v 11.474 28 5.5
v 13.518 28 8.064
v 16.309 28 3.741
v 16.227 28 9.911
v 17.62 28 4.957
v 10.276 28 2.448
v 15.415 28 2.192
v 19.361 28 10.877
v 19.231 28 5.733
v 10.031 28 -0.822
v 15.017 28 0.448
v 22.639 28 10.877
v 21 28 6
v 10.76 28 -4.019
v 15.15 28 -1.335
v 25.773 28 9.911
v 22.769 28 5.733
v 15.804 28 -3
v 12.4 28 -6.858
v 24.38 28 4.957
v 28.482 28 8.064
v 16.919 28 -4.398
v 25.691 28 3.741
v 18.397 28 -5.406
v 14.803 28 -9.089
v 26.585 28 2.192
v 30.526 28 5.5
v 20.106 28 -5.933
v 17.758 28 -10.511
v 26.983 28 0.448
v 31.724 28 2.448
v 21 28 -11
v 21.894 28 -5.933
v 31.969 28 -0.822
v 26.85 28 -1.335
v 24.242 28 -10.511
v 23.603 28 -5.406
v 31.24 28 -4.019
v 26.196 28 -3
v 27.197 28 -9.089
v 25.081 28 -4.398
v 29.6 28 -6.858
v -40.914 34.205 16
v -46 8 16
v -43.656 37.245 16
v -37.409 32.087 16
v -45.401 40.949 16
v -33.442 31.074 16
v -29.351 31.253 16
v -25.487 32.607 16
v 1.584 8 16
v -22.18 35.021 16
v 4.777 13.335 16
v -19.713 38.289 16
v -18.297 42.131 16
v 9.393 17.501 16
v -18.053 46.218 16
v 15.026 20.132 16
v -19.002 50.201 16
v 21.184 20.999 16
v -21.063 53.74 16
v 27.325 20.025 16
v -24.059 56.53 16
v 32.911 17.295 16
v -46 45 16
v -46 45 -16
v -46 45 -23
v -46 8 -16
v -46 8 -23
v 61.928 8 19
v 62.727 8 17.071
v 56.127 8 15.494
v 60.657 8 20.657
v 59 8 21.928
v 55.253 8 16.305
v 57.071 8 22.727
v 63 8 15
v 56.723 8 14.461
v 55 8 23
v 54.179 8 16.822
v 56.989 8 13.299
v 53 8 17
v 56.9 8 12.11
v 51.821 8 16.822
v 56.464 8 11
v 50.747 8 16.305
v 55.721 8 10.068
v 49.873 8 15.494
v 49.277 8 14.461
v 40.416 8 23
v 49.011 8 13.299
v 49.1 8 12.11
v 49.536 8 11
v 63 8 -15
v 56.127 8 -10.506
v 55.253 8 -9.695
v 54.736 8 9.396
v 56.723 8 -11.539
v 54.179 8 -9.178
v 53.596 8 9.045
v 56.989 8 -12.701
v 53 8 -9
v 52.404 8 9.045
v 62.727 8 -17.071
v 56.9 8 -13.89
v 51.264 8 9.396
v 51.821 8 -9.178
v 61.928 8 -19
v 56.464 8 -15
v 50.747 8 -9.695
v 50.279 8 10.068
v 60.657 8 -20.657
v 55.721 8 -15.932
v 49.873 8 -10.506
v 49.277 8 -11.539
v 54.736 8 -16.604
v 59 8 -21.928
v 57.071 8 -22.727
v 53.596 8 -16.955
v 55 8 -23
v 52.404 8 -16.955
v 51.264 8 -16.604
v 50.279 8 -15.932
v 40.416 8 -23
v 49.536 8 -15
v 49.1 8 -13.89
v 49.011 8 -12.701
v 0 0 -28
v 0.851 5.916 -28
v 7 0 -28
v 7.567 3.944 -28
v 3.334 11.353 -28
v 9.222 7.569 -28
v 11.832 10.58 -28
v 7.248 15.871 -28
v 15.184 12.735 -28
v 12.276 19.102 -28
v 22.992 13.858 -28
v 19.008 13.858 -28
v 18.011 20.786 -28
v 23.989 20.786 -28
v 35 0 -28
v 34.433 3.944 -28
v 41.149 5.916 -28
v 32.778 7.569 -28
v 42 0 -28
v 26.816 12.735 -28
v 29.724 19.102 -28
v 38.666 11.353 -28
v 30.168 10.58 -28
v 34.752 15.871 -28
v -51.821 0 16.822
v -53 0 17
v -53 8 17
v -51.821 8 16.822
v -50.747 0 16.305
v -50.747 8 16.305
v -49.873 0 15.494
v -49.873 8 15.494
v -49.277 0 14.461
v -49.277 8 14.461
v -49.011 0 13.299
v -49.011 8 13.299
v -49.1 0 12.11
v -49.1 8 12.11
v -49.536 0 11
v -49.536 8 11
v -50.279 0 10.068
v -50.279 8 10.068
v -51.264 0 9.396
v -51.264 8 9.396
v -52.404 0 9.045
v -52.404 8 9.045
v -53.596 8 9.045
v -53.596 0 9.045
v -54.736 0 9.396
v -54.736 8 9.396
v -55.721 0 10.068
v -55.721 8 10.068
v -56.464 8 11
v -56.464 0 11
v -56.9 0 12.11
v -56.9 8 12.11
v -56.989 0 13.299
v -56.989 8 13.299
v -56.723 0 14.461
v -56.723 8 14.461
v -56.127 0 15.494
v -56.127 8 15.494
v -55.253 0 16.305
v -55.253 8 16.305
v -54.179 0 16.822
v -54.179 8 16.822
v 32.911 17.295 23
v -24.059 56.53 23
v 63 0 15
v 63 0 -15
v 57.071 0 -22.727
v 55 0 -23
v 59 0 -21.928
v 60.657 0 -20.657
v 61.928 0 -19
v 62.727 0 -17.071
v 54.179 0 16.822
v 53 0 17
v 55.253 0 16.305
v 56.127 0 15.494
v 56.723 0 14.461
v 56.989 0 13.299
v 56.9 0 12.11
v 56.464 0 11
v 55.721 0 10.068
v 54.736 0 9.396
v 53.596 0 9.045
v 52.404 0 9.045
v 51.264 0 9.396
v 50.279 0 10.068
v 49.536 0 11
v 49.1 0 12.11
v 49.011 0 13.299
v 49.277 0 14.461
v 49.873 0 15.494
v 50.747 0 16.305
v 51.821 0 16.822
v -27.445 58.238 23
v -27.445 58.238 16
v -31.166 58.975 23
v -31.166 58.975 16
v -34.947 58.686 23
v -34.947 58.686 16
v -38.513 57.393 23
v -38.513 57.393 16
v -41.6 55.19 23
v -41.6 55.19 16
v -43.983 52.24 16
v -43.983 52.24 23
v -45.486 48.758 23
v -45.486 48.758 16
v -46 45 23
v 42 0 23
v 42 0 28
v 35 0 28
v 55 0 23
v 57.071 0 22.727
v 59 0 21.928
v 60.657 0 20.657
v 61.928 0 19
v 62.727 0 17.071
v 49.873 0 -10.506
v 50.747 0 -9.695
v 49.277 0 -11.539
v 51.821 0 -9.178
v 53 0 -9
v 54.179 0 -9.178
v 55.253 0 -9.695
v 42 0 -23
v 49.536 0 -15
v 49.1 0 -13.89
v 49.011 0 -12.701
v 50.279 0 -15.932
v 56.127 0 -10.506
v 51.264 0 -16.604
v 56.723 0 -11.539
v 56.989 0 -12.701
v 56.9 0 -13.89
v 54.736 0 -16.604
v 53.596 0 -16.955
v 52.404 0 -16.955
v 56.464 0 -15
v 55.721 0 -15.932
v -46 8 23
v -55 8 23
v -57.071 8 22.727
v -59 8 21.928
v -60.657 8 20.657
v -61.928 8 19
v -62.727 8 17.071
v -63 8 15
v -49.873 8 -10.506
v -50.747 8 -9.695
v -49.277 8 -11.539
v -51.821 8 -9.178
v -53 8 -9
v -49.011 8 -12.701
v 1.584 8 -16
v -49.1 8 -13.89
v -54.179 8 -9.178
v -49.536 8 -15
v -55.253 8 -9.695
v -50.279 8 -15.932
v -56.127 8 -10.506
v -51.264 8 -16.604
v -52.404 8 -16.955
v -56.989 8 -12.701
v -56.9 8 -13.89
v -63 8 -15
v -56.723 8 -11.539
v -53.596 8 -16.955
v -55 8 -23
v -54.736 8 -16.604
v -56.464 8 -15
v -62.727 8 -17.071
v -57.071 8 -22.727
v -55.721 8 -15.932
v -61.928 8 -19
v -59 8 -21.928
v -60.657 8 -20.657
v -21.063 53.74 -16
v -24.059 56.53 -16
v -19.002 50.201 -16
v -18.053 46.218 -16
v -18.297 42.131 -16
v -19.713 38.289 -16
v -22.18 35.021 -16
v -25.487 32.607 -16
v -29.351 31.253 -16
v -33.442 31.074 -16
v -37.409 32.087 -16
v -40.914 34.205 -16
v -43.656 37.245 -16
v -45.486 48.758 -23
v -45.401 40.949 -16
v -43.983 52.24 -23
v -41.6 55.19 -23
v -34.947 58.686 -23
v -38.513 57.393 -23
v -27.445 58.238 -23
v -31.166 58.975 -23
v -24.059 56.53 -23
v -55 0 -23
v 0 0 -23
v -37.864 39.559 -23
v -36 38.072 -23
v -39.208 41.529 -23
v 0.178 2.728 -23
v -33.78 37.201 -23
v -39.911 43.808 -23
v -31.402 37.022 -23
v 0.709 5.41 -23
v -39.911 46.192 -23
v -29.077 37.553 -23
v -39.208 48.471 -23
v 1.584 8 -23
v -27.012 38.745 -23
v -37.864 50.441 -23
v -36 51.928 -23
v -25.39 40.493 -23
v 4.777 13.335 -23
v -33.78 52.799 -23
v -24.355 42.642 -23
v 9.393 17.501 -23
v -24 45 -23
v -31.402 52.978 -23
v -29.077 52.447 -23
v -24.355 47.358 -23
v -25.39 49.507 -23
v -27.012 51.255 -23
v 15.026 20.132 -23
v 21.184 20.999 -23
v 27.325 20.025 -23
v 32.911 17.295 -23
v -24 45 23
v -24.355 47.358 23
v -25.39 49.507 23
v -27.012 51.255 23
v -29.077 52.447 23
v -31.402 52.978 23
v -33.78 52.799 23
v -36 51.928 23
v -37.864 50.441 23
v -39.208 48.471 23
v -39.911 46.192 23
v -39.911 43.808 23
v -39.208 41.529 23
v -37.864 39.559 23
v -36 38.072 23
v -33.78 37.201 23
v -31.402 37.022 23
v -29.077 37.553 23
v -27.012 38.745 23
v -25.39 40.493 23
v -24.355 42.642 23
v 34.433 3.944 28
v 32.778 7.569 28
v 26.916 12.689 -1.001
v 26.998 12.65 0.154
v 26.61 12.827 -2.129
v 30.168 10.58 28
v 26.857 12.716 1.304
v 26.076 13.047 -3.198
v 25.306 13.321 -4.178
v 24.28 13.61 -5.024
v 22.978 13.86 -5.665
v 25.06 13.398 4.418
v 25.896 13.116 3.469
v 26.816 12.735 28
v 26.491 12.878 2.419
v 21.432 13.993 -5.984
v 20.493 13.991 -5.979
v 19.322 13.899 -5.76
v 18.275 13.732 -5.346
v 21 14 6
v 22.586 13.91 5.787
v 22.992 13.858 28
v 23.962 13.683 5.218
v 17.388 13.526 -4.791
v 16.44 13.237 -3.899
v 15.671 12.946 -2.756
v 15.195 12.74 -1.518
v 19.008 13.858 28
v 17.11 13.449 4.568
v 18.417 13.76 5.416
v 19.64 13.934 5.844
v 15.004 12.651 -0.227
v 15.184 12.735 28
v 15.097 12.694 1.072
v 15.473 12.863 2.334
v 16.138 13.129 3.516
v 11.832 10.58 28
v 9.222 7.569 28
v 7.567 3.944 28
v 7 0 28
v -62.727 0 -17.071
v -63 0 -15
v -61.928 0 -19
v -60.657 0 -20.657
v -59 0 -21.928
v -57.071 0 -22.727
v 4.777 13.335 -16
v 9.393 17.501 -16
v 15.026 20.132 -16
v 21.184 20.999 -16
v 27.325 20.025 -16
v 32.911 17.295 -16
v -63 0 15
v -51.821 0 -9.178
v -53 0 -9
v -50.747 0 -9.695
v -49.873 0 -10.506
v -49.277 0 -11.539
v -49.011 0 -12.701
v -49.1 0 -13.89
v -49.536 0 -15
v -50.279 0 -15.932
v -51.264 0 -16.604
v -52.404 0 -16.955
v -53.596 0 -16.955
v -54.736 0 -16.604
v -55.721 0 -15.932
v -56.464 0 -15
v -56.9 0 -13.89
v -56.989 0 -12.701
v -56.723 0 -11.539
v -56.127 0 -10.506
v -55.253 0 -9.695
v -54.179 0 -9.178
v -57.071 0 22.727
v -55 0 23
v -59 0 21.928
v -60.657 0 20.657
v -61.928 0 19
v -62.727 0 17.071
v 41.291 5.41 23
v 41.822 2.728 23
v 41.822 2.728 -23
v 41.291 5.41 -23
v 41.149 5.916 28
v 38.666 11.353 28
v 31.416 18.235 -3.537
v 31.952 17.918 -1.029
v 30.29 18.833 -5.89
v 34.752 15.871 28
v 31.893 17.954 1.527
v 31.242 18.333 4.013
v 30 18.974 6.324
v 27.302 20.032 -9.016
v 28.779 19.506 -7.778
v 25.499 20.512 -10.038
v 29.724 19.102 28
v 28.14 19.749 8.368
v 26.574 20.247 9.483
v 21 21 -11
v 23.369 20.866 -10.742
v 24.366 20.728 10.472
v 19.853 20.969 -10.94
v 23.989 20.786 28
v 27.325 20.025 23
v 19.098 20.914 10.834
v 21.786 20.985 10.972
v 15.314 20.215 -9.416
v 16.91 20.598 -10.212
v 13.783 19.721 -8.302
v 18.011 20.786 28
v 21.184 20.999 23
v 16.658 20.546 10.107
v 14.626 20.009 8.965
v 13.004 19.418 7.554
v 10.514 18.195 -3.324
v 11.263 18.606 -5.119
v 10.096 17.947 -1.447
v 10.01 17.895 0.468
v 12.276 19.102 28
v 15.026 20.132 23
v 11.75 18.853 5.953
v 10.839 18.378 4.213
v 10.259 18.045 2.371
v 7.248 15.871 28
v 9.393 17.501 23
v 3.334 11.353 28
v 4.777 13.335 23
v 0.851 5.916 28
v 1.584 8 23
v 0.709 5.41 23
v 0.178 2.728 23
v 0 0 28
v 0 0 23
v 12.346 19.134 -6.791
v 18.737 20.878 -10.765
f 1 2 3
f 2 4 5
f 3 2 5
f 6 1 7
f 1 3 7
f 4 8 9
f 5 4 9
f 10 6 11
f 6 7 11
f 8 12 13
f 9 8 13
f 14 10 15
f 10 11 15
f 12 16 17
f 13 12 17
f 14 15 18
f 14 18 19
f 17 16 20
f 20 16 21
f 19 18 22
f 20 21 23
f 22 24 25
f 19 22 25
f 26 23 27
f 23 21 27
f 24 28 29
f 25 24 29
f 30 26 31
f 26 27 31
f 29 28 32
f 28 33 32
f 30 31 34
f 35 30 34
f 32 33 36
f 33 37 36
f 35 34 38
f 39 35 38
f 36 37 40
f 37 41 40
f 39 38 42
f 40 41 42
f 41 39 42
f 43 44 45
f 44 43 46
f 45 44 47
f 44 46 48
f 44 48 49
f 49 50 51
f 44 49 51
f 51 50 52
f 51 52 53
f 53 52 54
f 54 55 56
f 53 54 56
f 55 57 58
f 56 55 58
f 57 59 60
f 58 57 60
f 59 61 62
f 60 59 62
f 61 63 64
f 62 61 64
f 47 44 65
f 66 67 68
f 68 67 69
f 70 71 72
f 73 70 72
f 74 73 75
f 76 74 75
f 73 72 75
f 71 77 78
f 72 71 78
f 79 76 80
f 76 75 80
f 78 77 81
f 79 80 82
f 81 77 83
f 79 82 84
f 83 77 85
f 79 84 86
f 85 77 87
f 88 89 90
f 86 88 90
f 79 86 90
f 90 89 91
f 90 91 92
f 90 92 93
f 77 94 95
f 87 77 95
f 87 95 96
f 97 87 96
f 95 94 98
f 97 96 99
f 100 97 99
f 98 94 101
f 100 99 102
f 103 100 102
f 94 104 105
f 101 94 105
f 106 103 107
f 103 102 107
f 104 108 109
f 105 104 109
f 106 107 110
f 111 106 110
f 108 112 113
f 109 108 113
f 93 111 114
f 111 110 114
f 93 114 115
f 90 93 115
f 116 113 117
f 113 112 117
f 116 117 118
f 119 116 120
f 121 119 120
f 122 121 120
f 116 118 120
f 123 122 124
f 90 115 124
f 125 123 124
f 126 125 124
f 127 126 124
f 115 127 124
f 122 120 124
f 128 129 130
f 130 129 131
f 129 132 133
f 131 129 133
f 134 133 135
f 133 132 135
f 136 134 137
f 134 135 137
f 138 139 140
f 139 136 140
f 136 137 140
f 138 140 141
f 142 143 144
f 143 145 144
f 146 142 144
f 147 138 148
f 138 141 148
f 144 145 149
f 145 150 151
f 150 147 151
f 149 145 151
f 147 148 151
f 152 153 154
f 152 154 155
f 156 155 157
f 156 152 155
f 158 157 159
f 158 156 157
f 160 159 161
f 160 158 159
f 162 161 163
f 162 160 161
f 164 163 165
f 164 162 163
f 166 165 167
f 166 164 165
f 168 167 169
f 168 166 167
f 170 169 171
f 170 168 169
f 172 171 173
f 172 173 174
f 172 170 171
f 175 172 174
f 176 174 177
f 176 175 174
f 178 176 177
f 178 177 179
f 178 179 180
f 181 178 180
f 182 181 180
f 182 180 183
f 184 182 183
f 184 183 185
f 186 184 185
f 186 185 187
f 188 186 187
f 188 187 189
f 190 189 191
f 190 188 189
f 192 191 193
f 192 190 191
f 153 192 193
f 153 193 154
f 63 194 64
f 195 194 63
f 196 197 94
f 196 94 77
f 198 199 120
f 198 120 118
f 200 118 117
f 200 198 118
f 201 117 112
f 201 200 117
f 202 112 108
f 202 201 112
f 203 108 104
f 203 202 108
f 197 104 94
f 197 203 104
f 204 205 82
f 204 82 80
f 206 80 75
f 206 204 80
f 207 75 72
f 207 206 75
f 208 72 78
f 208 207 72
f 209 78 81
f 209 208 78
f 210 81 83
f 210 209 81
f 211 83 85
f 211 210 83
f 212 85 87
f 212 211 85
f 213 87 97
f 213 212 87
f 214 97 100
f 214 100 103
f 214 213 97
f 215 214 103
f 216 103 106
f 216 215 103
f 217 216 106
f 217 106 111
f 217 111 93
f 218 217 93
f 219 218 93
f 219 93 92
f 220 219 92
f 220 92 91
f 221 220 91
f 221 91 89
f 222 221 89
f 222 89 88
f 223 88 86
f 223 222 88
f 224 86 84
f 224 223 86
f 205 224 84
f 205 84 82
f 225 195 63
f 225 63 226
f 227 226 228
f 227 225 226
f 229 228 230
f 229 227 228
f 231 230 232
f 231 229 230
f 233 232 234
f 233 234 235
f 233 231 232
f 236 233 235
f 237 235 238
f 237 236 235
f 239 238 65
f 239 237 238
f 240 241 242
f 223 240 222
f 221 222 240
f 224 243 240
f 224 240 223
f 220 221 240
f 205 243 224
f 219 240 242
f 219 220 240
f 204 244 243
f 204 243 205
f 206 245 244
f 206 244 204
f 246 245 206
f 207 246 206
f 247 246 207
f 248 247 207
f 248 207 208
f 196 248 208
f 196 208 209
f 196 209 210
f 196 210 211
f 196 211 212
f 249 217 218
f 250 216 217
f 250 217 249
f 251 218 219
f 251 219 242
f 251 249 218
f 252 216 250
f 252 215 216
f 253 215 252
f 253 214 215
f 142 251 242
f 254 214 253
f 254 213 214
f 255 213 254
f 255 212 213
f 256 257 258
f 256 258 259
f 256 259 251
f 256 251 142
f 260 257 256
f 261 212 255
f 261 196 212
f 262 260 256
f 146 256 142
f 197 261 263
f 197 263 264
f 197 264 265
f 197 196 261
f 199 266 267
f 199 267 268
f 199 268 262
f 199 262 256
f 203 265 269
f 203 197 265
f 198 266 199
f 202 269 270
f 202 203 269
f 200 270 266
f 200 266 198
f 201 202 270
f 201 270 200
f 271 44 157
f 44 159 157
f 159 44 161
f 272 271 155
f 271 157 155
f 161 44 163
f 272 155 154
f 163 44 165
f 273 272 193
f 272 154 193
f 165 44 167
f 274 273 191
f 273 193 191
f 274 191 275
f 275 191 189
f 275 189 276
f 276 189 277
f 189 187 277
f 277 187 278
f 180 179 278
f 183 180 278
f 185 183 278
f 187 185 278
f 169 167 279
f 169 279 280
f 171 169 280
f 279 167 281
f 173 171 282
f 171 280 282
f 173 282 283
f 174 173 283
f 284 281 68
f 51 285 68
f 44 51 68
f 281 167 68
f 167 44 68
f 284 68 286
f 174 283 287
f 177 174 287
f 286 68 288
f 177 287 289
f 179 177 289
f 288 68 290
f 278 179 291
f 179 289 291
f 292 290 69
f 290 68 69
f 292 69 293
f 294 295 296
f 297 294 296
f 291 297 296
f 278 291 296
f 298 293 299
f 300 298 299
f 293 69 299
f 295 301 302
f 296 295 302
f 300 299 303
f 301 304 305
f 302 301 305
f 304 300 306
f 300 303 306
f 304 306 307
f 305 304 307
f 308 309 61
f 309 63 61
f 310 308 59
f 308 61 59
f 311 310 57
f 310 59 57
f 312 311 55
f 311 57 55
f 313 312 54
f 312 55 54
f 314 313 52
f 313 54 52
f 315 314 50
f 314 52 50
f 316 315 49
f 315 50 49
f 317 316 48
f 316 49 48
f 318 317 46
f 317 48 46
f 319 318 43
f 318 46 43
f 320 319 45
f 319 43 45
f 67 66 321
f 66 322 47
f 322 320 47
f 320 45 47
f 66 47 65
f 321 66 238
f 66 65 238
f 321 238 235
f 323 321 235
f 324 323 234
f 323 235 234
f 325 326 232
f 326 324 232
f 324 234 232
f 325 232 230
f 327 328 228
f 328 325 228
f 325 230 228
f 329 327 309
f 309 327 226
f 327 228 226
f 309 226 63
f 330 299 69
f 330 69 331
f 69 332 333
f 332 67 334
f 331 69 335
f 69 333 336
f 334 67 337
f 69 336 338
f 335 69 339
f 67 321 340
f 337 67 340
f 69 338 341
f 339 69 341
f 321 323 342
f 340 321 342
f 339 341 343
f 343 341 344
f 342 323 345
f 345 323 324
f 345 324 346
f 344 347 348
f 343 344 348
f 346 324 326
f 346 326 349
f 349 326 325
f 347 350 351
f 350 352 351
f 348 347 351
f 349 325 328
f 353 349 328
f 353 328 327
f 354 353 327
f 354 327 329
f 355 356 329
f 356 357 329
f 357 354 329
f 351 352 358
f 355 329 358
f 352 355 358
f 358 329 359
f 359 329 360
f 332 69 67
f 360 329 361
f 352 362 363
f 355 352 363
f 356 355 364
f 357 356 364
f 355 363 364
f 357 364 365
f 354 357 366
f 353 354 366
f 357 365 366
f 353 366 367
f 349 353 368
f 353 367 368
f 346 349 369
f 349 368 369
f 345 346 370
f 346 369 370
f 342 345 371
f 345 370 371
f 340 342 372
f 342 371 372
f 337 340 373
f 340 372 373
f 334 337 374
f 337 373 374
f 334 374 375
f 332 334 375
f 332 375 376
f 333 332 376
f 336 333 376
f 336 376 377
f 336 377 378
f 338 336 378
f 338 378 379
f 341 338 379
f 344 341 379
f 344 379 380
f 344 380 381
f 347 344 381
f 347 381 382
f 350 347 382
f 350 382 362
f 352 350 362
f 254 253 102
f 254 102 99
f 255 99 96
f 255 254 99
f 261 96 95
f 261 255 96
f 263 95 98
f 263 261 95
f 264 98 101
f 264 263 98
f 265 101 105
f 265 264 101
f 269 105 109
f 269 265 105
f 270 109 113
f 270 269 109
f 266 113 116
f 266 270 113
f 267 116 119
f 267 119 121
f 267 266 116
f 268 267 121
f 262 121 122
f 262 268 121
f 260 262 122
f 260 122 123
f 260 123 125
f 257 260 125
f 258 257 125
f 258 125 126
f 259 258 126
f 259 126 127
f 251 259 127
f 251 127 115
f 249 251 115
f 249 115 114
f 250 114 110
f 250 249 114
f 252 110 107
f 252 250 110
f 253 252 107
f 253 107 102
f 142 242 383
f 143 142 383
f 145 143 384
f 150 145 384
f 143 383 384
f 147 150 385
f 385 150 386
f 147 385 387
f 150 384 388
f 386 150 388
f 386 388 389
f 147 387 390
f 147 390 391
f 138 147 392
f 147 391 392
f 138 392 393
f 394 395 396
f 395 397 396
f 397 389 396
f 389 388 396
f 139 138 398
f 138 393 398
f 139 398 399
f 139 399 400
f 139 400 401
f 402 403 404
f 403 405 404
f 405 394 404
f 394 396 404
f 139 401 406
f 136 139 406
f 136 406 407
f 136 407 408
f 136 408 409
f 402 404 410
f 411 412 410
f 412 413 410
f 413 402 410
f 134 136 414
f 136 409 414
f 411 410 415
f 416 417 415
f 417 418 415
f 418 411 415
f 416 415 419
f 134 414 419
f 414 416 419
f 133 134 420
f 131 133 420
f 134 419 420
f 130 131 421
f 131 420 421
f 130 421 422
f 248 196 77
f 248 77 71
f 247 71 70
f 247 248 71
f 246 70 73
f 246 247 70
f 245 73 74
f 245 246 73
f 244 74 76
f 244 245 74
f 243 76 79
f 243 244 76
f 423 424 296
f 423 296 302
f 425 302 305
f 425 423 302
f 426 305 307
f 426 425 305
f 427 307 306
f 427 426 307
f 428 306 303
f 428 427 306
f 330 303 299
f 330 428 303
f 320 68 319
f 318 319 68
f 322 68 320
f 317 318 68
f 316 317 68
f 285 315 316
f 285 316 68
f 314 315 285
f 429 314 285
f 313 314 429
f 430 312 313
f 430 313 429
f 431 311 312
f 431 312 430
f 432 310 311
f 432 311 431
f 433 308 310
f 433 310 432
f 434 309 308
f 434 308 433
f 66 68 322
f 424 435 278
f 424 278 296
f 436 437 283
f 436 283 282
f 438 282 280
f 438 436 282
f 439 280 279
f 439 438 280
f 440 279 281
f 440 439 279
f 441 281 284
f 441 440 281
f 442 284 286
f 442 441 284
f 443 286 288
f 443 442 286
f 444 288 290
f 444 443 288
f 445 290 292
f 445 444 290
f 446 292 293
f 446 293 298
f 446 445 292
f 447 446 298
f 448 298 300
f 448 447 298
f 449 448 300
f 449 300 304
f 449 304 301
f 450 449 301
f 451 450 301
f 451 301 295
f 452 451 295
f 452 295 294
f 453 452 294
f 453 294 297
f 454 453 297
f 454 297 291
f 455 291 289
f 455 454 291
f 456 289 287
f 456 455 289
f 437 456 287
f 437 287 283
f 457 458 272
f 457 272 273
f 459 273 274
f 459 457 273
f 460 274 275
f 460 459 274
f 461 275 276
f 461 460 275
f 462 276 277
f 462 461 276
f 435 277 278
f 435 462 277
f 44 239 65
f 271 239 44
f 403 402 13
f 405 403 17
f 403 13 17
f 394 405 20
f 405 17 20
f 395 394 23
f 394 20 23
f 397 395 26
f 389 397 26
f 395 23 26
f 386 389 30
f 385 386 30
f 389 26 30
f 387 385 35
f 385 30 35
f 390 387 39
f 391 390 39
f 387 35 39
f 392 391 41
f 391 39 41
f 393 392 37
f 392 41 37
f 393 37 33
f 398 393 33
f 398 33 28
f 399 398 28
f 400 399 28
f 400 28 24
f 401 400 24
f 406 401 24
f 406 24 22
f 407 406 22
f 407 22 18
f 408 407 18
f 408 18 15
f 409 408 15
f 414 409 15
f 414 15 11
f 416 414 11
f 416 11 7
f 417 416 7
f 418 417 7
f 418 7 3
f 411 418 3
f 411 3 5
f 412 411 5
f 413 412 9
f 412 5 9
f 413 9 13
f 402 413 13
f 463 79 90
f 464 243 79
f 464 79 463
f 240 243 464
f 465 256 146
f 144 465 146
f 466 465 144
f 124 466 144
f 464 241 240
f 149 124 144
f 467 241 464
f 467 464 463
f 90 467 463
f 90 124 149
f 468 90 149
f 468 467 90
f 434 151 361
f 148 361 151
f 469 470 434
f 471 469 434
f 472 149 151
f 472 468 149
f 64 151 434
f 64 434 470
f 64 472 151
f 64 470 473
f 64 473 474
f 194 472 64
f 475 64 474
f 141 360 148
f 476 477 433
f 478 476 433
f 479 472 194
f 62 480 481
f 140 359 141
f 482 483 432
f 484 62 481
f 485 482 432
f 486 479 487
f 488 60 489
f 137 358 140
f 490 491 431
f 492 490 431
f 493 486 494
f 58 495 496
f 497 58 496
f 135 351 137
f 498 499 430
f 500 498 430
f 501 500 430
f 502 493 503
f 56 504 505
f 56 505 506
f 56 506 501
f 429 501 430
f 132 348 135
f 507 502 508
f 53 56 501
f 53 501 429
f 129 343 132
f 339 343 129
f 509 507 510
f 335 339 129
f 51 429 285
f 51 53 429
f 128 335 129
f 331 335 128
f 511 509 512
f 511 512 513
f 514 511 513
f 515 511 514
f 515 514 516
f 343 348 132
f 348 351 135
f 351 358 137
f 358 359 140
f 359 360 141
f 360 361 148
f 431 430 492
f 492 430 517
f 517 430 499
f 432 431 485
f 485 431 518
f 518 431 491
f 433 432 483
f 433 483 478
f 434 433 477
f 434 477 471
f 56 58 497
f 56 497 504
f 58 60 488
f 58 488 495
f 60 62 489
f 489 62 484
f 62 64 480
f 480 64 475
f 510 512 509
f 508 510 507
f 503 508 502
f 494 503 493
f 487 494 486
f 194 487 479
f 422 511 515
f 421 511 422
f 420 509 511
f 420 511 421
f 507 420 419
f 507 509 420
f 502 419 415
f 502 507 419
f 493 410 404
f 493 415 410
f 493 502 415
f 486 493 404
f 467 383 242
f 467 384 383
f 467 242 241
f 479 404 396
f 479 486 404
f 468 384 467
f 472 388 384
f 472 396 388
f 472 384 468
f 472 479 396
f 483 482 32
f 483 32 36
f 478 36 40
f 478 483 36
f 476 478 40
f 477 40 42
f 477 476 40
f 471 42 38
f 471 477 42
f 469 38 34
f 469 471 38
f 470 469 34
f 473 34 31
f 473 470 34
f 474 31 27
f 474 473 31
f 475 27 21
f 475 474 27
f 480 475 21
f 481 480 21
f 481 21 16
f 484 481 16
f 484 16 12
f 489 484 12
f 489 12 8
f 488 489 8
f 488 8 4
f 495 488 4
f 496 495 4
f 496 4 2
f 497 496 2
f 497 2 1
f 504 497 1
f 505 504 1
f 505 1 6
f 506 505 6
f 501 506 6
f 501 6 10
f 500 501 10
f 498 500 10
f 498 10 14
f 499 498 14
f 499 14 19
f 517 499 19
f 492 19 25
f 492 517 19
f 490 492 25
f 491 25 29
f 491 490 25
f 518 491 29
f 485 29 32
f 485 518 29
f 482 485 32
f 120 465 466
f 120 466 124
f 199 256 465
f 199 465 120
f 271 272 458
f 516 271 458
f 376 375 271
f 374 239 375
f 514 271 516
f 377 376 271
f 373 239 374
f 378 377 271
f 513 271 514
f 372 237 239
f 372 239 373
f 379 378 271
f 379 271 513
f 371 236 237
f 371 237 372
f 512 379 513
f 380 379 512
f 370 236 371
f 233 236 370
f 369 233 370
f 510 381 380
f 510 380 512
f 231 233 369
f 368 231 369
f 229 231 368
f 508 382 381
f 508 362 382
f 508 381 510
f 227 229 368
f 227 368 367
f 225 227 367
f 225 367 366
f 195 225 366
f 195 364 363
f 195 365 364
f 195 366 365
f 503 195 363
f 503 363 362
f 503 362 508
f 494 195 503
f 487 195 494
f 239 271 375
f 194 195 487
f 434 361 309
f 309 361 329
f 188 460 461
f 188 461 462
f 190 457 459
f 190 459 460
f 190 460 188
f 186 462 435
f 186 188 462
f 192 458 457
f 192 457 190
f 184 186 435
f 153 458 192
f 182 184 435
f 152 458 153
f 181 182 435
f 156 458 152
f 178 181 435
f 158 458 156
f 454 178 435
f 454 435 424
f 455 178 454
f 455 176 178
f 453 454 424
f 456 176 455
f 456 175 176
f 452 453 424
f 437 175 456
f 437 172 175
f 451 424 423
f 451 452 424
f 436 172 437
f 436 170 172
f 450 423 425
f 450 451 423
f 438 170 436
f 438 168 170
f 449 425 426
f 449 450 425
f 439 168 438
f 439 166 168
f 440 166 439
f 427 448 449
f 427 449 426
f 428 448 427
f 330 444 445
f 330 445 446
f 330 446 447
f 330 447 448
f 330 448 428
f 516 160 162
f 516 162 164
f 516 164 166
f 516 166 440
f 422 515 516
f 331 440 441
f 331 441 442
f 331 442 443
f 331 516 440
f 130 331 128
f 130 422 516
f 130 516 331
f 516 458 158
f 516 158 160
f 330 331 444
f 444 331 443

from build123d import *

# Parameters (mm, degrees)
SKETCH1_R                = 4
BOSS_EXTRUDE1_DEPTH      = 8
BOSS_EXTRUDE2_DEPTH      = 5
BOSS_EXTRUDE2_DEPTH_BACK = 51
BOSS_EXTRUDE3_DEPTH      = 7
BOSS_EXTRUDE5_REACH      = 46
SKETCH7_R                = 14
SKETCH4_R                = 11
BOSS_EXTRUDE4_DEPTH      = 28
CUT_EXTRUDE1_REACH       = 58
SKETCH5_R                = 14
SKETCH5_R_2              = 8
SKETCH6_R                = 6
CUT_EXTRUDE2_DEPTH       = 28


with BuildPart() as part:
    # Sketch1 → Boss-Extrude1 (new body)
    with BuildSketch(Plane(origin=(0, 0, 0), x_dir=(1, 0, 0), z_dir=(0, 1, 0))):
        with BuildLine():
            Line((55, -23), (-55, -23))
            ThreePointArc((-55, -23), (-60.656854249, -20.656854249), (-63, -15))
            Line((-63, -15), (-63, 15))
            ThreePointArc((-63, 15), (-60.656854249, 20.656854249), (-55, 23))
            Line((-55, 23), (55, 23))
            ThreePointArc((55, 23), (60.656854249, 20.656854249), (63, 15))
            Line((63, 15), (63, -15))
            ThreePointArc((63, -15), (60.656854249, -20.656854249), (55, -23))
        make_face()
        with Locations(Location((-53, 13, 0), (0, 0, 270))):  # turned: the seam where the file's is
            Circle(SKETCH1_R, mode=Mode.SUBTRACT)
        with Locations(Location((53, 13, 0), (0, 0, 270))):  # turned: the seam where the file's is
            Circle(SKETCH1_R, mode=Mode.SUBTRACT)
        with Locations(Location((-53, -13, 0), (0, 0, 270))):  # turned: the seam where the file's is
            Circle(SKETCH1_R, mode=Mode.SUBTRACT)
        with Locations(Location((53, -13, 0), (0, 0, 270))):  # turned: the seam where the file's is
            Circle(SKETCH1_R, mode=Mode.SUBTRACT)
    extrude(amount=BOSS_EXTRUDE1_DEPTH)

    # Sketch2 → Boss-Extrude2 (add, two sides)
    with BuildSketch(Plane.XY.offset(23)) as boss_extrude2_sk:
        with BuildLine():
            Line((0, 0), (42, 0))
            ThreePointArc((42, 0), (21, 21), (0, 0))
        make_face()
    extrude(amount=BOSS_EXTRUDE2_DEPTH)
    extrude(boss_extrude2_sk.sketch, amount=-BOSS_EXTRUDE2_DEPTH_BACK)

    # Sketch3 → Boss-Extrude3 (add)
    with BuildSketch(Plane.XY.offset(23)):
        with BuildLine():
            Line((-46, 45), (-46, 0))
            Line((-46, 0), (0, 0))
            ThreePointArc((0, 0), (11.23098253, 18.589413591), (32.911075968, 17.295267251))
            Line((32.911075968, 17.295267251), (-24.059282688, 56.530178167))
            ThreePointArc((-24.059282688, 56.530178167), (-38.512678314, 57.392942394), (-46, 45))
        make_face()
    boss_extrude3 = extrude(amount=-BOSS_EXTRUDE3_DEPTH)

    # Mirror1: Boss-Extrude3 across plane
    add(boss_extrude3.mirror(Plane.XY))

    # Sketch7 → Boss-Extrude5 (add, up to next)
    with BuildSketch(Plane(origin=(0, 0, 16), x_dir=(-1, 0, 0), z_dir=(0, 0, -1)), mode=Mode.PRIVATE) as boss_extrude5_sk1:
        with Locations(Location((32, 45, 0), (0, 0, 124.554792234))):  # turned: the seam where the file's is
            Circle(SKETCH7_R)
    boss_extrude5_tool1 = extrude(boss_extrude5_sk1.sketch, amount=BOSS_EXTRUDE5_REACH, mode=Mode.PRIVATE) - part.part
    add(boss_extrude5_tool1.solids().sort_by_distance((-32, 45, 16))[0])

    # Sketch4 → Boss-Extrude4 (add)
    with BuildSketch(Plane.XZ):
        with Locations(Location((21, 0, 0), (0, 0, 270))):  # turned: the seam where the file's is
            Circle(SKETCH4_R)
    extrude(amount=-BOSS_EXTRUDE4_DEPTH)

    # Sketch5 → Cut-Extrude1 (cut, up to next)
    with BuildSketch(Plane.XY.offset(28), mode=Mode.PRIVATE) as cut_extrude1_sk1:
        with Locations((21, 0)):
            Circle(SKETCH5_R)
    cut_extrude1_tool1 = extrude(cut_extrude1_sk1.sketch, amount=-CUT_EXTRUDE1_REACH, mode=Mode.PRIVATE) & part.part
    add(cut_extrude1_tool1.solids().sort_by_distance((21, 0, 28))[0], mode=Mode.SUBTRACT)
    # Sketch5 → Cut-Extrude1 (cut, up to next)
    with BuildSketch(Plane.XY.offset(28), mode=Mode.PRIVATE) as cut_extrude1_sk2:
        with Locations((-32, 45)):
            Circle(SKETCH5_R_2)
    cut_extrude1_tool2 = extrude(cut_extrude1_sk2.sketch, amount=-CUT_EXTRUDE1_REACH, mode=Mode.PRIVATE) & part.part
    add(cut_extrude1_tool2.solids().sort_by_distance((-32, 45, 28))[0], mode=Mode.SUBTRACT)

    # Sketch6 → Cut-Extrude2 (cut)
    with BuildSketch(Plane(origin=(0, 28, 0), x_dir=(1, 0, 0), z_dir=(0, 1, 0))):
        with Locations(Location((21, 0, 0), (0, 0, 270))):  # turned: the seam where the file's is
            Circle(SKETCH6_R)
    extrude(amount=-CUT_EXTRUDE2_DEPTH, mode=Mode.SUBTRACT)


solid = part.part
